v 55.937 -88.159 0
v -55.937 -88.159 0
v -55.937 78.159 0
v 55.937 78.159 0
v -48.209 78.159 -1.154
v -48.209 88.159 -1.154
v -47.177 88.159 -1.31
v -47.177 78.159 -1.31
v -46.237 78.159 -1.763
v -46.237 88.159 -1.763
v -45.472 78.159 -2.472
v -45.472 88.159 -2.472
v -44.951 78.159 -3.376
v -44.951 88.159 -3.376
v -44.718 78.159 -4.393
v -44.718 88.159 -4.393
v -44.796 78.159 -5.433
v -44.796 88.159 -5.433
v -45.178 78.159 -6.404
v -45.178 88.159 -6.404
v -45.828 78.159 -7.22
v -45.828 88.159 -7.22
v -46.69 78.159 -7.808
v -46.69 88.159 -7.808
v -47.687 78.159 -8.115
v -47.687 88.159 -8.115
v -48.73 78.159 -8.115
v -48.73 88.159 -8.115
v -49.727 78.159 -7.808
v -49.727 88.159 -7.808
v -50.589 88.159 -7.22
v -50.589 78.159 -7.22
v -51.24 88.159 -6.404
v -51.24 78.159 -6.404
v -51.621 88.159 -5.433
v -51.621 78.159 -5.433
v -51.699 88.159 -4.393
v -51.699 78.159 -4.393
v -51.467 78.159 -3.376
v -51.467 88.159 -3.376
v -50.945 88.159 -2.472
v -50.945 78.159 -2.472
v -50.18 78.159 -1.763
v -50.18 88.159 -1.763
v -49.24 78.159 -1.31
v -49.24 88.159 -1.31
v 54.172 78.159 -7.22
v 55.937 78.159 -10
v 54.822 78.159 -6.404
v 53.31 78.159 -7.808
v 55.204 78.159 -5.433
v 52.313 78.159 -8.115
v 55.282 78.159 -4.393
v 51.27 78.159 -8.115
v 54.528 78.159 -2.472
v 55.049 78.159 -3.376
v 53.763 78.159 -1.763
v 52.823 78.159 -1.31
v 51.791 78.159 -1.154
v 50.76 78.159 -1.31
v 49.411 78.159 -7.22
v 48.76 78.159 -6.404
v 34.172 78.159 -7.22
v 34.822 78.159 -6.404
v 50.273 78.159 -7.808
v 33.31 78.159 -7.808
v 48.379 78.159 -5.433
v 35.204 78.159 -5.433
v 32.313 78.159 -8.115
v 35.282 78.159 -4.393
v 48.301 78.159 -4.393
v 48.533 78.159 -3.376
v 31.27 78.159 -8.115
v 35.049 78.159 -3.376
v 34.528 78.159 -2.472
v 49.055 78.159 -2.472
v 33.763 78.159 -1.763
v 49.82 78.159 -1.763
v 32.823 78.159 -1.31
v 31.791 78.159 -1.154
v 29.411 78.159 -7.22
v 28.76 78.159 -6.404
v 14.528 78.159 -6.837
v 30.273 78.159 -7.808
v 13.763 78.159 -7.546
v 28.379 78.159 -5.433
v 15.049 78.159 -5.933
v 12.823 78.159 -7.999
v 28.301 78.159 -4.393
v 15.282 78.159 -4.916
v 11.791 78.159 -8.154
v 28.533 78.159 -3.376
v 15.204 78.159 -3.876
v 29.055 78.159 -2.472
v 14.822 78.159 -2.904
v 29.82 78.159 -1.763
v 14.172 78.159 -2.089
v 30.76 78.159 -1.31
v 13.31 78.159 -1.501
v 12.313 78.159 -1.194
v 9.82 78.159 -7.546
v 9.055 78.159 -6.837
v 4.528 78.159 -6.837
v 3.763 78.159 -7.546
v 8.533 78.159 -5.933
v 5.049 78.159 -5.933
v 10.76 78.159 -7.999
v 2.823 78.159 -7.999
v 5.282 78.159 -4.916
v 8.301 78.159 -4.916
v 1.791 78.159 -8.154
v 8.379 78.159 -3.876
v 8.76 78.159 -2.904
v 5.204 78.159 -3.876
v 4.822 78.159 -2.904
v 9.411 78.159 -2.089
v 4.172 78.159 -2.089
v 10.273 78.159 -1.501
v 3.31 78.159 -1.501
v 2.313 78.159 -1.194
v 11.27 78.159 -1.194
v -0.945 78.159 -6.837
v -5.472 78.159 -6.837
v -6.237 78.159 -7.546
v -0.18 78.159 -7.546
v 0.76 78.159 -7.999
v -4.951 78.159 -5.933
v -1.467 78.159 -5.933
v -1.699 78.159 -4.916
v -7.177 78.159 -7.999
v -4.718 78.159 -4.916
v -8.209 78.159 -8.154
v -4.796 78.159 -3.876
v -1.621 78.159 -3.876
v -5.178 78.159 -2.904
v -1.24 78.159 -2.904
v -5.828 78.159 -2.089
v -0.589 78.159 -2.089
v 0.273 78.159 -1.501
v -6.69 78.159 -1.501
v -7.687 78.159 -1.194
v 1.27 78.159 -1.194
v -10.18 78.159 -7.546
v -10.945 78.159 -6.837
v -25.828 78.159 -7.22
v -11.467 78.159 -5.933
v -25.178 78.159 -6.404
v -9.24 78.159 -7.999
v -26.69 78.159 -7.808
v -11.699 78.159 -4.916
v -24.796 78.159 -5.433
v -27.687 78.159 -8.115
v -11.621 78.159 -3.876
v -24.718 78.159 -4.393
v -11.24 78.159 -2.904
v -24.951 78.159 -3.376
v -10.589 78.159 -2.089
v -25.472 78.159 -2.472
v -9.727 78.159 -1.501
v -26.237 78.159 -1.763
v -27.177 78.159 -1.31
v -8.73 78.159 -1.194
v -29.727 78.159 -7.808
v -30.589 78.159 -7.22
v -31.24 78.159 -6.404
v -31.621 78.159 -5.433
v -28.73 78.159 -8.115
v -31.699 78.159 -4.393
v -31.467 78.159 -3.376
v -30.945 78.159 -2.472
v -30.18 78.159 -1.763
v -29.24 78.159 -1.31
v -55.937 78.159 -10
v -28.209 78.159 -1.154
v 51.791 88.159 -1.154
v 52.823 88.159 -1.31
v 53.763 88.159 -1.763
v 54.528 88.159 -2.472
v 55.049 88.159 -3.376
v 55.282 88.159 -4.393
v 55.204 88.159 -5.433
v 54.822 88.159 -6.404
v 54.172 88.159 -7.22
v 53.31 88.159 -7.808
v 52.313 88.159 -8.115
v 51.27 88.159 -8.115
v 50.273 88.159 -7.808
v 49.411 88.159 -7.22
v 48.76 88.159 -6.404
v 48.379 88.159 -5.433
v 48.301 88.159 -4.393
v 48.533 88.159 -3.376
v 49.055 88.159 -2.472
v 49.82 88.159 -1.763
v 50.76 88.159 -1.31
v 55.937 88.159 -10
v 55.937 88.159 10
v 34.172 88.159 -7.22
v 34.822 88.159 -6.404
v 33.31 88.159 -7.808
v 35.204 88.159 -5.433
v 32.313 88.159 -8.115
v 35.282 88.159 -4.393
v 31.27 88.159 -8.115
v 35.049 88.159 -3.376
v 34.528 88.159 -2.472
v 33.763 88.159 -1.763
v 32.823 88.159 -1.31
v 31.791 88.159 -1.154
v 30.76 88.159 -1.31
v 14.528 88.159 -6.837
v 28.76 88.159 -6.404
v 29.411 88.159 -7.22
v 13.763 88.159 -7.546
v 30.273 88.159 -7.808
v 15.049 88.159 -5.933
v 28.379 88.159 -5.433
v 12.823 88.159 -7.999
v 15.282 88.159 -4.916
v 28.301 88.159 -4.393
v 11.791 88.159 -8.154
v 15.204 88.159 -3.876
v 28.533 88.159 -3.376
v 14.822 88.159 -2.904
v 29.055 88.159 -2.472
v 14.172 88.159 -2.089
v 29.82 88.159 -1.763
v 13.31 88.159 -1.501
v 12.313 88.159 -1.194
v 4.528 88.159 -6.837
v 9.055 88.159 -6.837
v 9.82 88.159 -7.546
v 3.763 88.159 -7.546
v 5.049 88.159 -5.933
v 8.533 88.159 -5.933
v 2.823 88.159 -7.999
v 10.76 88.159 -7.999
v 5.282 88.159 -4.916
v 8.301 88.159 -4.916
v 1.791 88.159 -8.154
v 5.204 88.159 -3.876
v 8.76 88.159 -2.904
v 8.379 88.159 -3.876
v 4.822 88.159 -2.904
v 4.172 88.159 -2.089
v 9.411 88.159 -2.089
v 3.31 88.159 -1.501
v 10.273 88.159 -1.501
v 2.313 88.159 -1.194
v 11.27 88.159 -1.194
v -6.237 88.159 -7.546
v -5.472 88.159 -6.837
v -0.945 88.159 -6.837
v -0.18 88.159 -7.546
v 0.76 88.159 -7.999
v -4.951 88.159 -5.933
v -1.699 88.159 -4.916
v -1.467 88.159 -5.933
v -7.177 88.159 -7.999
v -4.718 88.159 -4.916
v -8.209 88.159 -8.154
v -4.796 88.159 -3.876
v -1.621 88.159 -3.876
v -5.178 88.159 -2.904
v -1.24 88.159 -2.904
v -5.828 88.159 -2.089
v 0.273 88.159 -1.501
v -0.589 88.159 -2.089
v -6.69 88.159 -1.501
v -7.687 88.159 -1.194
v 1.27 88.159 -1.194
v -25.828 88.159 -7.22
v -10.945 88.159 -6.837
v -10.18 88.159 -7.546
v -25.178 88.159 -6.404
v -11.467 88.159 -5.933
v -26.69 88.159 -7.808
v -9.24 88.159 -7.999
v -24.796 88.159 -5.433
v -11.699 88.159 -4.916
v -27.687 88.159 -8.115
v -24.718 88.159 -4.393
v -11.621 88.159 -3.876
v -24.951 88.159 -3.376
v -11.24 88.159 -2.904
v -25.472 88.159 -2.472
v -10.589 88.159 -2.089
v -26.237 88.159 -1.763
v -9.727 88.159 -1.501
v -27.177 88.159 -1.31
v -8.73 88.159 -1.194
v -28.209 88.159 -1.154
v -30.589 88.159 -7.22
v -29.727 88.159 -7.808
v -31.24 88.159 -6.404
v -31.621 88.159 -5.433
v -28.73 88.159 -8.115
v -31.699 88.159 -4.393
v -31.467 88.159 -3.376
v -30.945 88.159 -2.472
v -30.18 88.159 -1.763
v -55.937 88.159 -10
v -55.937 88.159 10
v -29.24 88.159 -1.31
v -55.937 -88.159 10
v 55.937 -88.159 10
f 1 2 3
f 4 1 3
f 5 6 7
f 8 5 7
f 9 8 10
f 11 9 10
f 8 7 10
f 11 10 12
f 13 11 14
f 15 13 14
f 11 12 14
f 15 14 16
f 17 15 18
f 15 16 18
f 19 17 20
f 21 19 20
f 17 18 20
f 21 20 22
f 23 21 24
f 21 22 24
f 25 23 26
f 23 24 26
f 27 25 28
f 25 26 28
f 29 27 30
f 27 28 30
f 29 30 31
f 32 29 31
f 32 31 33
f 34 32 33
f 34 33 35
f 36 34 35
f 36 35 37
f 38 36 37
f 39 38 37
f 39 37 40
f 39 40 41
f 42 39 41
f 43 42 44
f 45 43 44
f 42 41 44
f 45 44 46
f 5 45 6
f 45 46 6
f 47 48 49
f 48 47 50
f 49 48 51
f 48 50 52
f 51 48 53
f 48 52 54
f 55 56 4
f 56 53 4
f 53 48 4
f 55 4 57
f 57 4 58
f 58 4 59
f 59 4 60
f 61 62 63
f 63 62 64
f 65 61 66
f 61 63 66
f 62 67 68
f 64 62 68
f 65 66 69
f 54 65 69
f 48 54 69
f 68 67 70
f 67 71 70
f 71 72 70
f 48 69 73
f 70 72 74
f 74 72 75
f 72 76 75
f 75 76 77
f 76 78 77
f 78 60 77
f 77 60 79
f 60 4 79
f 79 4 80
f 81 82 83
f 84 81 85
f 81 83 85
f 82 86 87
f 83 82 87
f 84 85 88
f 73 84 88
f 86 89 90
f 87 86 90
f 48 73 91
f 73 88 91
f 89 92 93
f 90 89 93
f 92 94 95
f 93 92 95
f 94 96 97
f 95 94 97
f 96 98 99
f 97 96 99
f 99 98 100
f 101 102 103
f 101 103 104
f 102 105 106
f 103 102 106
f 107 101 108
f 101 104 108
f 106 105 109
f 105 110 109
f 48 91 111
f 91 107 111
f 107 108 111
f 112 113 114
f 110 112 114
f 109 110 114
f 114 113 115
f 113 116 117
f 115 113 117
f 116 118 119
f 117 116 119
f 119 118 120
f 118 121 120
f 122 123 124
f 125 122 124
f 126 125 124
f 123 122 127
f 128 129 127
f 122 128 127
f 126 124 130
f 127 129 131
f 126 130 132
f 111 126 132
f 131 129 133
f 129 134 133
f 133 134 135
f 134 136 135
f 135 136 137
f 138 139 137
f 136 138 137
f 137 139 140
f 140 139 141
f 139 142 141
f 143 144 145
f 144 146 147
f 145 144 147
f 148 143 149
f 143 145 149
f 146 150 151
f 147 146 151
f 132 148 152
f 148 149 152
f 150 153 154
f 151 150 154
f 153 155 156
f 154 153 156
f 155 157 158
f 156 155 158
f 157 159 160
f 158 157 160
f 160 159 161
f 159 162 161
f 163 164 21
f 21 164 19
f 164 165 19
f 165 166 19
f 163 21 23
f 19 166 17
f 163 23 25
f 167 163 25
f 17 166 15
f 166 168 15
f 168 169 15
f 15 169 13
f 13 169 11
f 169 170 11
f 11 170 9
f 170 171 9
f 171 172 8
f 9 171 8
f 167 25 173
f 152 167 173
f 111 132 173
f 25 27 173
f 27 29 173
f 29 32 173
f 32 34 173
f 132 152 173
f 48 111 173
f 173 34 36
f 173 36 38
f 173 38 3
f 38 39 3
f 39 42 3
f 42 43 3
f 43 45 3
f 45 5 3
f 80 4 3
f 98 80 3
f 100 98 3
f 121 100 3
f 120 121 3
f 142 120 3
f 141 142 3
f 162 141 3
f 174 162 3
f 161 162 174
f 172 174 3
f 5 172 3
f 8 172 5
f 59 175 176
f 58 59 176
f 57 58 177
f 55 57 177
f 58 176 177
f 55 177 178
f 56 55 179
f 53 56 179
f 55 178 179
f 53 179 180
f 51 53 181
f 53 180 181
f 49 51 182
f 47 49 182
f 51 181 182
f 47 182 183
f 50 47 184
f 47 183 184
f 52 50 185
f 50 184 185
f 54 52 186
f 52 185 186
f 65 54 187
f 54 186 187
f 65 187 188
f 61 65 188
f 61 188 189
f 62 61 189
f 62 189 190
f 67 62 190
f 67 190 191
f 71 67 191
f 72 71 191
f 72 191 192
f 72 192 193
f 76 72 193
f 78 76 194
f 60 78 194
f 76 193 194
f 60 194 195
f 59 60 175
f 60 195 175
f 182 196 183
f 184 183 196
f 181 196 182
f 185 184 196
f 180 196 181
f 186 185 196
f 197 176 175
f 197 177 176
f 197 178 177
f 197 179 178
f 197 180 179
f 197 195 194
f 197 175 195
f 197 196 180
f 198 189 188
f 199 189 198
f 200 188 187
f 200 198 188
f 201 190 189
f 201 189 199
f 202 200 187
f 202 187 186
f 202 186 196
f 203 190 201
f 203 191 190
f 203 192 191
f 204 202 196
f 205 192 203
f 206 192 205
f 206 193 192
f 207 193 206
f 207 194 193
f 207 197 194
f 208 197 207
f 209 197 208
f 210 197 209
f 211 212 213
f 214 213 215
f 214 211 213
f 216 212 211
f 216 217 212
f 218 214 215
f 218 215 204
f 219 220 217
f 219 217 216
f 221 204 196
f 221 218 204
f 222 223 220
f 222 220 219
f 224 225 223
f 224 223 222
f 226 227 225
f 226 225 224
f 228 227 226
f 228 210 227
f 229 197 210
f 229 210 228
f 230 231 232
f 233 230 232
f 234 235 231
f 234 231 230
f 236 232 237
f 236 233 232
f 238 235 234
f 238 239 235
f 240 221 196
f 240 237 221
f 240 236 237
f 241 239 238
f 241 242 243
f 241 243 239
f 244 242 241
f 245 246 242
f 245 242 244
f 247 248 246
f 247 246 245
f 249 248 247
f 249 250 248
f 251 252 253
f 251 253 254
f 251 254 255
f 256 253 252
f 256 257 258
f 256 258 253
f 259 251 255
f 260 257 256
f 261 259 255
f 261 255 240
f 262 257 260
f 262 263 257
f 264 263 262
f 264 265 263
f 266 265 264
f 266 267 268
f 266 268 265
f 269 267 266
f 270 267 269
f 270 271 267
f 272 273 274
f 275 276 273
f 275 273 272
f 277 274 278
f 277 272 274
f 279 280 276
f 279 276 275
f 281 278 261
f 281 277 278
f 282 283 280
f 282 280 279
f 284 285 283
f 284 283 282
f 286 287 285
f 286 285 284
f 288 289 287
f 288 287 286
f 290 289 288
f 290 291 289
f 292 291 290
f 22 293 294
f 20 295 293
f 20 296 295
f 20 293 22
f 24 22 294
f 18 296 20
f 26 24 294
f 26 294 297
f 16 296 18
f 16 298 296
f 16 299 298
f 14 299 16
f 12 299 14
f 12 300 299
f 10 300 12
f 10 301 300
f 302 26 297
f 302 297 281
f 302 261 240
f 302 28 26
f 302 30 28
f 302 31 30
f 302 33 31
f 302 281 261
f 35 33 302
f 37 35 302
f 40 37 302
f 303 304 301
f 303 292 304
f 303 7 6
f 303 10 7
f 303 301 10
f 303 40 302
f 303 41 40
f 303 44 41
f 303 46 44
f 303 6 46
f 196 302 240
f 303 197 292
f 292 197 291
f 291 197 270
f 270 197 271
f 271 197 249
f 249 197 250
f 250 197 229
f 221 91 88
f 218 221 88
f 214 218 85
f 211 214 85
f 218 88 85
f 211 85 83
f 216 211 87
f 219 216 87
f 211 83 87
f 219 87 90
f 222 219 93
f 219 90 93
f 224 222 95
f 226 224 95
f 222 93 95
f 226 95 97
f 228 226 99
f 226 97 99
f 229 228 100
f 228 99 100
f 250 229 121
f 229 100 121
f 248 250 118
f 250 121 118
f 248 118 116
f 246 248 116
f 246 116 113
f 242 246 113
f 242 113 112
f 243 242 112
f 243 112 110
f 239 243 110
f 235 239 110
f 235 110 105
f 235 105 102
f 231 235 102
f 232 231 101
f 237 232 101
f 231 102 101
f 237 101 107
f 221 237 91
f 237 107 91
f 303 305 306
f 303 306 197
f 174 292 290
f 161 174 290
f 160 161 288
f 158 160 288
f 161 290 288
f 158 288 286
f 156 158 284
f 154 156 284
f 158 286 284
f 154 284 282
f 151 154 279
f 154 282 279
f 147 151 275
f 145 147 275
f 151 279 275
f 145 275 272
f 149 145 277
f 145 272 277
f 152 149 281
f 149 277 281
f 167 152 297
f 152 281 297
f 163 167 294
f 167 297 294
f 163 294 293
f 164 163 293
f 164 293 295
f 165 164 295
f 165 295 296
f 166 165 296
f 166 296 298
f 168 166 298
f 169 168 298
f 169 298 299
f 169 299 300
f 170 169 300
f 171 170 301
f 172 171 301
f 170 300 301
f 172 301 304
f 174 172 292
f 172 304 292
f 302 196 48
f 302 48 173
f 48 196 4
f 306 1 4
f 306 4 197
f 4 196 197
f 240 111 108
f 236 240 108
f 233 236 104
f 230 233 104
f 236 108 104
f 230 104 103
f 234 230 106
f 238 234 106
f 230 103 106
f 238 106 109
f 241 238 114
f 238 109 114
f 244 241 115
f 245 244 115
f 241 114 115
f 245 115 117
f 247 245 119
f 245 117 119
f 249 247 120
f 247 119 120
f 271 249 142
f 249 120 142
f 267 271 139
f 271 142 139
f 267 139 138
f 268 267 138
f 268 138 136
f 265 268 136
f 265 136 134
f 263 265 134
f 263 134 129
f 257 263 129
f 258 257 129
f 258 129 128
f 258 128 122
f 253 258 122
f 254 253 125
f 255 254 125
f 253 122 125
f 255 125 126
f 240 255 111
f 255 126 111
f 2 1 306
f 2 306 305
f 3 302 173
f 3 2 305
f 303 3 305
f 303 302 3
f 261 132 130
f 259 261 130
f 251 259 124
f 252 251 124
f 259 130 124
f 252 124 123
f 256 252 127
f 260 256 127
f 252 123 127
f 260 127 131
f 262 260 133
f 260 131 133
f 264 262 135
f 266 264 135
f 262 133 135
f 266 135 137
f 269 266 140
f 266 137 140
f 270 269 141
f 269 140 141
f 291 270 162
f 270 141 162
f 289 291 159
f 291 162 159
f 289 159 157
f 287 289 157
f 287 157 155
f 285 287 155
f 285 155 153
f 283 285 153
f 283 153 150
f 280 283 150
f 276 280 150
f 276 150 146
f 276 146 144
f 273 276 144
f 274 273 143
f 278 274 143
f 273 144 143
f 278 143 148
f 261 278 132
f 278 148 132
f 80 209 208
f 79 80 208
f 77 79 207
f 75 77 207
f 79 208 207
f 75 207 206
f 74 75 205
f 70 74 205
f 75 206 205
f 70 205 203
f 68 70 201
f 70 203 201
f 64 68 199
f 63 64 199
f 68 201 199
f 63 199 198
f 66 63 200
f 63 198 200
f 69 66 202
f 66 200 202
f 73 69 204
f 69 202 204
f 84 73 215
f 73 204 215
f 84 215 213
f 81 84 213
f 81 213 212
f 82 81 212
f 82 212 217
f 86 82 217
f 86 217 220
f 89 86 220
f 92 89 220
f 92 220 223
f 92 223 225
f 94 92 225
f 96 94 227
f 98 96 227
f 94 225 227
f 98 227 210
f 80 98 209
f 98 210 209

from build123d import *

# Parameters (mm, degrees)
ESQUISSE1_W             = 176.318824712
ESQUISSE1_H             = 111.873178338
BOSS_EXTRU_1_DEPTH      = 10
ESQUISSE2_W             = 111.873178338
ESQUISSE2_H             = 10
BOSS_EXTRU_3_DEPTH      = 10
ESQUISSE3_R             = 3.5
ENL_V_MAT_EXTRU_1_DEPTH = 10
ESQUISSE4_R             = 3.5
ENL_V_MAT_EXTRU_2_DEPTH = 10
ESQUISSE5_R             = 3.5
ENL_V_MAT_EXTRU_4_DEPTH = 10


with BuildPart() as part:
    # Esquisse1 → Boss.-Extru.1 (new body)
    with BuildSketch(Plane(origin=(0, 0, 0), x_dir=(0, 1, 0), z_dir=(0, 0, 1))):
        Rectangle(ESQUISSE1_W, ESQUISSE1_H)
    extrude(amount=BOSS_EXTRU_1_DEPTH)

    # Esquisse2 → Boss.-Extru.3 (add)
    with BuildSketch(Plane(origin=(0, 88.159412356, 0), x_dir=(-1, 0, 0), z_dir=(0, 1, 0))):
        with Locations((0, -5)):
            Rectangle(ESQUISSE2_W, ESQUISSE2_H)
    extrude(amount=-BOSS_EXTRU_3_DEPTH)

    # Esquisse3 → Enlèv. mat.-Extru.1 (cut)
    with BuildSketch(Plane.XZ.offset(-78.159412356)):
        with Locations(Location((11.791315902, -4.654466803, 0), (0, 0, 270))):
            Circle(ESQUISSE3_R)
        with Locations(Location((1.791315902, -4.654466803, 0), (0, 0, 270))):
            Circle(ESQUISSE3_R)
        with Locations(Location((-8.208684098, -4.654466803, 0), (0, 0, 270))):
            Circle(ESQUISSE3_R)
    extrude(amount=-ENL_V_MAT_EXTRU_1_DEPTH, mode=Mode.SUBTRACT)

    # Esquisse4 → Enlèv. mat.-Extru.2 (cut)
    with BuildSketch(Plane(origin=(0, 88.159412356, 0), x_dir=(-1, 0, 0), z_dir=(0, 1, 0))):
        with Locations(Location((-31.791315902, -4.654466803, 0), (0, 0, 90))):
            Circle(ESQUISSE4_R)
        with Locations(Location((28.208684098, -4.654466803, 0), (0, 0, 90))):
            Circle(ESQUISSE4_R)
    extrude(amount=-ENL_V_MAT_EXTRU_2_DEPTH, mode=Mode.SUBTRACT)

    # Esquisse5 → Enlèv. mat.-Extru.4 (cut)
    with BuildSketch(Plane(origin=(0, 88.159412356, 0), x_dir=(1, 0, 0), z_dir=(0, 1, 0))):
        with Locations(Location((-48.208684098, 4.654466803, 0), (0, 0, 270))):
            Circle(ESQUISSE5_R)
        with Locations(Location((51.791315902, 4.654466803, 0), (0, 0, 270))):
            Circle(ESQUISSE5_R)
    extrude(amount=-ENL_V_MAT_EXTRU_4_DEPTH, mode=Mode.SUBTRACT)


solid = part.part
